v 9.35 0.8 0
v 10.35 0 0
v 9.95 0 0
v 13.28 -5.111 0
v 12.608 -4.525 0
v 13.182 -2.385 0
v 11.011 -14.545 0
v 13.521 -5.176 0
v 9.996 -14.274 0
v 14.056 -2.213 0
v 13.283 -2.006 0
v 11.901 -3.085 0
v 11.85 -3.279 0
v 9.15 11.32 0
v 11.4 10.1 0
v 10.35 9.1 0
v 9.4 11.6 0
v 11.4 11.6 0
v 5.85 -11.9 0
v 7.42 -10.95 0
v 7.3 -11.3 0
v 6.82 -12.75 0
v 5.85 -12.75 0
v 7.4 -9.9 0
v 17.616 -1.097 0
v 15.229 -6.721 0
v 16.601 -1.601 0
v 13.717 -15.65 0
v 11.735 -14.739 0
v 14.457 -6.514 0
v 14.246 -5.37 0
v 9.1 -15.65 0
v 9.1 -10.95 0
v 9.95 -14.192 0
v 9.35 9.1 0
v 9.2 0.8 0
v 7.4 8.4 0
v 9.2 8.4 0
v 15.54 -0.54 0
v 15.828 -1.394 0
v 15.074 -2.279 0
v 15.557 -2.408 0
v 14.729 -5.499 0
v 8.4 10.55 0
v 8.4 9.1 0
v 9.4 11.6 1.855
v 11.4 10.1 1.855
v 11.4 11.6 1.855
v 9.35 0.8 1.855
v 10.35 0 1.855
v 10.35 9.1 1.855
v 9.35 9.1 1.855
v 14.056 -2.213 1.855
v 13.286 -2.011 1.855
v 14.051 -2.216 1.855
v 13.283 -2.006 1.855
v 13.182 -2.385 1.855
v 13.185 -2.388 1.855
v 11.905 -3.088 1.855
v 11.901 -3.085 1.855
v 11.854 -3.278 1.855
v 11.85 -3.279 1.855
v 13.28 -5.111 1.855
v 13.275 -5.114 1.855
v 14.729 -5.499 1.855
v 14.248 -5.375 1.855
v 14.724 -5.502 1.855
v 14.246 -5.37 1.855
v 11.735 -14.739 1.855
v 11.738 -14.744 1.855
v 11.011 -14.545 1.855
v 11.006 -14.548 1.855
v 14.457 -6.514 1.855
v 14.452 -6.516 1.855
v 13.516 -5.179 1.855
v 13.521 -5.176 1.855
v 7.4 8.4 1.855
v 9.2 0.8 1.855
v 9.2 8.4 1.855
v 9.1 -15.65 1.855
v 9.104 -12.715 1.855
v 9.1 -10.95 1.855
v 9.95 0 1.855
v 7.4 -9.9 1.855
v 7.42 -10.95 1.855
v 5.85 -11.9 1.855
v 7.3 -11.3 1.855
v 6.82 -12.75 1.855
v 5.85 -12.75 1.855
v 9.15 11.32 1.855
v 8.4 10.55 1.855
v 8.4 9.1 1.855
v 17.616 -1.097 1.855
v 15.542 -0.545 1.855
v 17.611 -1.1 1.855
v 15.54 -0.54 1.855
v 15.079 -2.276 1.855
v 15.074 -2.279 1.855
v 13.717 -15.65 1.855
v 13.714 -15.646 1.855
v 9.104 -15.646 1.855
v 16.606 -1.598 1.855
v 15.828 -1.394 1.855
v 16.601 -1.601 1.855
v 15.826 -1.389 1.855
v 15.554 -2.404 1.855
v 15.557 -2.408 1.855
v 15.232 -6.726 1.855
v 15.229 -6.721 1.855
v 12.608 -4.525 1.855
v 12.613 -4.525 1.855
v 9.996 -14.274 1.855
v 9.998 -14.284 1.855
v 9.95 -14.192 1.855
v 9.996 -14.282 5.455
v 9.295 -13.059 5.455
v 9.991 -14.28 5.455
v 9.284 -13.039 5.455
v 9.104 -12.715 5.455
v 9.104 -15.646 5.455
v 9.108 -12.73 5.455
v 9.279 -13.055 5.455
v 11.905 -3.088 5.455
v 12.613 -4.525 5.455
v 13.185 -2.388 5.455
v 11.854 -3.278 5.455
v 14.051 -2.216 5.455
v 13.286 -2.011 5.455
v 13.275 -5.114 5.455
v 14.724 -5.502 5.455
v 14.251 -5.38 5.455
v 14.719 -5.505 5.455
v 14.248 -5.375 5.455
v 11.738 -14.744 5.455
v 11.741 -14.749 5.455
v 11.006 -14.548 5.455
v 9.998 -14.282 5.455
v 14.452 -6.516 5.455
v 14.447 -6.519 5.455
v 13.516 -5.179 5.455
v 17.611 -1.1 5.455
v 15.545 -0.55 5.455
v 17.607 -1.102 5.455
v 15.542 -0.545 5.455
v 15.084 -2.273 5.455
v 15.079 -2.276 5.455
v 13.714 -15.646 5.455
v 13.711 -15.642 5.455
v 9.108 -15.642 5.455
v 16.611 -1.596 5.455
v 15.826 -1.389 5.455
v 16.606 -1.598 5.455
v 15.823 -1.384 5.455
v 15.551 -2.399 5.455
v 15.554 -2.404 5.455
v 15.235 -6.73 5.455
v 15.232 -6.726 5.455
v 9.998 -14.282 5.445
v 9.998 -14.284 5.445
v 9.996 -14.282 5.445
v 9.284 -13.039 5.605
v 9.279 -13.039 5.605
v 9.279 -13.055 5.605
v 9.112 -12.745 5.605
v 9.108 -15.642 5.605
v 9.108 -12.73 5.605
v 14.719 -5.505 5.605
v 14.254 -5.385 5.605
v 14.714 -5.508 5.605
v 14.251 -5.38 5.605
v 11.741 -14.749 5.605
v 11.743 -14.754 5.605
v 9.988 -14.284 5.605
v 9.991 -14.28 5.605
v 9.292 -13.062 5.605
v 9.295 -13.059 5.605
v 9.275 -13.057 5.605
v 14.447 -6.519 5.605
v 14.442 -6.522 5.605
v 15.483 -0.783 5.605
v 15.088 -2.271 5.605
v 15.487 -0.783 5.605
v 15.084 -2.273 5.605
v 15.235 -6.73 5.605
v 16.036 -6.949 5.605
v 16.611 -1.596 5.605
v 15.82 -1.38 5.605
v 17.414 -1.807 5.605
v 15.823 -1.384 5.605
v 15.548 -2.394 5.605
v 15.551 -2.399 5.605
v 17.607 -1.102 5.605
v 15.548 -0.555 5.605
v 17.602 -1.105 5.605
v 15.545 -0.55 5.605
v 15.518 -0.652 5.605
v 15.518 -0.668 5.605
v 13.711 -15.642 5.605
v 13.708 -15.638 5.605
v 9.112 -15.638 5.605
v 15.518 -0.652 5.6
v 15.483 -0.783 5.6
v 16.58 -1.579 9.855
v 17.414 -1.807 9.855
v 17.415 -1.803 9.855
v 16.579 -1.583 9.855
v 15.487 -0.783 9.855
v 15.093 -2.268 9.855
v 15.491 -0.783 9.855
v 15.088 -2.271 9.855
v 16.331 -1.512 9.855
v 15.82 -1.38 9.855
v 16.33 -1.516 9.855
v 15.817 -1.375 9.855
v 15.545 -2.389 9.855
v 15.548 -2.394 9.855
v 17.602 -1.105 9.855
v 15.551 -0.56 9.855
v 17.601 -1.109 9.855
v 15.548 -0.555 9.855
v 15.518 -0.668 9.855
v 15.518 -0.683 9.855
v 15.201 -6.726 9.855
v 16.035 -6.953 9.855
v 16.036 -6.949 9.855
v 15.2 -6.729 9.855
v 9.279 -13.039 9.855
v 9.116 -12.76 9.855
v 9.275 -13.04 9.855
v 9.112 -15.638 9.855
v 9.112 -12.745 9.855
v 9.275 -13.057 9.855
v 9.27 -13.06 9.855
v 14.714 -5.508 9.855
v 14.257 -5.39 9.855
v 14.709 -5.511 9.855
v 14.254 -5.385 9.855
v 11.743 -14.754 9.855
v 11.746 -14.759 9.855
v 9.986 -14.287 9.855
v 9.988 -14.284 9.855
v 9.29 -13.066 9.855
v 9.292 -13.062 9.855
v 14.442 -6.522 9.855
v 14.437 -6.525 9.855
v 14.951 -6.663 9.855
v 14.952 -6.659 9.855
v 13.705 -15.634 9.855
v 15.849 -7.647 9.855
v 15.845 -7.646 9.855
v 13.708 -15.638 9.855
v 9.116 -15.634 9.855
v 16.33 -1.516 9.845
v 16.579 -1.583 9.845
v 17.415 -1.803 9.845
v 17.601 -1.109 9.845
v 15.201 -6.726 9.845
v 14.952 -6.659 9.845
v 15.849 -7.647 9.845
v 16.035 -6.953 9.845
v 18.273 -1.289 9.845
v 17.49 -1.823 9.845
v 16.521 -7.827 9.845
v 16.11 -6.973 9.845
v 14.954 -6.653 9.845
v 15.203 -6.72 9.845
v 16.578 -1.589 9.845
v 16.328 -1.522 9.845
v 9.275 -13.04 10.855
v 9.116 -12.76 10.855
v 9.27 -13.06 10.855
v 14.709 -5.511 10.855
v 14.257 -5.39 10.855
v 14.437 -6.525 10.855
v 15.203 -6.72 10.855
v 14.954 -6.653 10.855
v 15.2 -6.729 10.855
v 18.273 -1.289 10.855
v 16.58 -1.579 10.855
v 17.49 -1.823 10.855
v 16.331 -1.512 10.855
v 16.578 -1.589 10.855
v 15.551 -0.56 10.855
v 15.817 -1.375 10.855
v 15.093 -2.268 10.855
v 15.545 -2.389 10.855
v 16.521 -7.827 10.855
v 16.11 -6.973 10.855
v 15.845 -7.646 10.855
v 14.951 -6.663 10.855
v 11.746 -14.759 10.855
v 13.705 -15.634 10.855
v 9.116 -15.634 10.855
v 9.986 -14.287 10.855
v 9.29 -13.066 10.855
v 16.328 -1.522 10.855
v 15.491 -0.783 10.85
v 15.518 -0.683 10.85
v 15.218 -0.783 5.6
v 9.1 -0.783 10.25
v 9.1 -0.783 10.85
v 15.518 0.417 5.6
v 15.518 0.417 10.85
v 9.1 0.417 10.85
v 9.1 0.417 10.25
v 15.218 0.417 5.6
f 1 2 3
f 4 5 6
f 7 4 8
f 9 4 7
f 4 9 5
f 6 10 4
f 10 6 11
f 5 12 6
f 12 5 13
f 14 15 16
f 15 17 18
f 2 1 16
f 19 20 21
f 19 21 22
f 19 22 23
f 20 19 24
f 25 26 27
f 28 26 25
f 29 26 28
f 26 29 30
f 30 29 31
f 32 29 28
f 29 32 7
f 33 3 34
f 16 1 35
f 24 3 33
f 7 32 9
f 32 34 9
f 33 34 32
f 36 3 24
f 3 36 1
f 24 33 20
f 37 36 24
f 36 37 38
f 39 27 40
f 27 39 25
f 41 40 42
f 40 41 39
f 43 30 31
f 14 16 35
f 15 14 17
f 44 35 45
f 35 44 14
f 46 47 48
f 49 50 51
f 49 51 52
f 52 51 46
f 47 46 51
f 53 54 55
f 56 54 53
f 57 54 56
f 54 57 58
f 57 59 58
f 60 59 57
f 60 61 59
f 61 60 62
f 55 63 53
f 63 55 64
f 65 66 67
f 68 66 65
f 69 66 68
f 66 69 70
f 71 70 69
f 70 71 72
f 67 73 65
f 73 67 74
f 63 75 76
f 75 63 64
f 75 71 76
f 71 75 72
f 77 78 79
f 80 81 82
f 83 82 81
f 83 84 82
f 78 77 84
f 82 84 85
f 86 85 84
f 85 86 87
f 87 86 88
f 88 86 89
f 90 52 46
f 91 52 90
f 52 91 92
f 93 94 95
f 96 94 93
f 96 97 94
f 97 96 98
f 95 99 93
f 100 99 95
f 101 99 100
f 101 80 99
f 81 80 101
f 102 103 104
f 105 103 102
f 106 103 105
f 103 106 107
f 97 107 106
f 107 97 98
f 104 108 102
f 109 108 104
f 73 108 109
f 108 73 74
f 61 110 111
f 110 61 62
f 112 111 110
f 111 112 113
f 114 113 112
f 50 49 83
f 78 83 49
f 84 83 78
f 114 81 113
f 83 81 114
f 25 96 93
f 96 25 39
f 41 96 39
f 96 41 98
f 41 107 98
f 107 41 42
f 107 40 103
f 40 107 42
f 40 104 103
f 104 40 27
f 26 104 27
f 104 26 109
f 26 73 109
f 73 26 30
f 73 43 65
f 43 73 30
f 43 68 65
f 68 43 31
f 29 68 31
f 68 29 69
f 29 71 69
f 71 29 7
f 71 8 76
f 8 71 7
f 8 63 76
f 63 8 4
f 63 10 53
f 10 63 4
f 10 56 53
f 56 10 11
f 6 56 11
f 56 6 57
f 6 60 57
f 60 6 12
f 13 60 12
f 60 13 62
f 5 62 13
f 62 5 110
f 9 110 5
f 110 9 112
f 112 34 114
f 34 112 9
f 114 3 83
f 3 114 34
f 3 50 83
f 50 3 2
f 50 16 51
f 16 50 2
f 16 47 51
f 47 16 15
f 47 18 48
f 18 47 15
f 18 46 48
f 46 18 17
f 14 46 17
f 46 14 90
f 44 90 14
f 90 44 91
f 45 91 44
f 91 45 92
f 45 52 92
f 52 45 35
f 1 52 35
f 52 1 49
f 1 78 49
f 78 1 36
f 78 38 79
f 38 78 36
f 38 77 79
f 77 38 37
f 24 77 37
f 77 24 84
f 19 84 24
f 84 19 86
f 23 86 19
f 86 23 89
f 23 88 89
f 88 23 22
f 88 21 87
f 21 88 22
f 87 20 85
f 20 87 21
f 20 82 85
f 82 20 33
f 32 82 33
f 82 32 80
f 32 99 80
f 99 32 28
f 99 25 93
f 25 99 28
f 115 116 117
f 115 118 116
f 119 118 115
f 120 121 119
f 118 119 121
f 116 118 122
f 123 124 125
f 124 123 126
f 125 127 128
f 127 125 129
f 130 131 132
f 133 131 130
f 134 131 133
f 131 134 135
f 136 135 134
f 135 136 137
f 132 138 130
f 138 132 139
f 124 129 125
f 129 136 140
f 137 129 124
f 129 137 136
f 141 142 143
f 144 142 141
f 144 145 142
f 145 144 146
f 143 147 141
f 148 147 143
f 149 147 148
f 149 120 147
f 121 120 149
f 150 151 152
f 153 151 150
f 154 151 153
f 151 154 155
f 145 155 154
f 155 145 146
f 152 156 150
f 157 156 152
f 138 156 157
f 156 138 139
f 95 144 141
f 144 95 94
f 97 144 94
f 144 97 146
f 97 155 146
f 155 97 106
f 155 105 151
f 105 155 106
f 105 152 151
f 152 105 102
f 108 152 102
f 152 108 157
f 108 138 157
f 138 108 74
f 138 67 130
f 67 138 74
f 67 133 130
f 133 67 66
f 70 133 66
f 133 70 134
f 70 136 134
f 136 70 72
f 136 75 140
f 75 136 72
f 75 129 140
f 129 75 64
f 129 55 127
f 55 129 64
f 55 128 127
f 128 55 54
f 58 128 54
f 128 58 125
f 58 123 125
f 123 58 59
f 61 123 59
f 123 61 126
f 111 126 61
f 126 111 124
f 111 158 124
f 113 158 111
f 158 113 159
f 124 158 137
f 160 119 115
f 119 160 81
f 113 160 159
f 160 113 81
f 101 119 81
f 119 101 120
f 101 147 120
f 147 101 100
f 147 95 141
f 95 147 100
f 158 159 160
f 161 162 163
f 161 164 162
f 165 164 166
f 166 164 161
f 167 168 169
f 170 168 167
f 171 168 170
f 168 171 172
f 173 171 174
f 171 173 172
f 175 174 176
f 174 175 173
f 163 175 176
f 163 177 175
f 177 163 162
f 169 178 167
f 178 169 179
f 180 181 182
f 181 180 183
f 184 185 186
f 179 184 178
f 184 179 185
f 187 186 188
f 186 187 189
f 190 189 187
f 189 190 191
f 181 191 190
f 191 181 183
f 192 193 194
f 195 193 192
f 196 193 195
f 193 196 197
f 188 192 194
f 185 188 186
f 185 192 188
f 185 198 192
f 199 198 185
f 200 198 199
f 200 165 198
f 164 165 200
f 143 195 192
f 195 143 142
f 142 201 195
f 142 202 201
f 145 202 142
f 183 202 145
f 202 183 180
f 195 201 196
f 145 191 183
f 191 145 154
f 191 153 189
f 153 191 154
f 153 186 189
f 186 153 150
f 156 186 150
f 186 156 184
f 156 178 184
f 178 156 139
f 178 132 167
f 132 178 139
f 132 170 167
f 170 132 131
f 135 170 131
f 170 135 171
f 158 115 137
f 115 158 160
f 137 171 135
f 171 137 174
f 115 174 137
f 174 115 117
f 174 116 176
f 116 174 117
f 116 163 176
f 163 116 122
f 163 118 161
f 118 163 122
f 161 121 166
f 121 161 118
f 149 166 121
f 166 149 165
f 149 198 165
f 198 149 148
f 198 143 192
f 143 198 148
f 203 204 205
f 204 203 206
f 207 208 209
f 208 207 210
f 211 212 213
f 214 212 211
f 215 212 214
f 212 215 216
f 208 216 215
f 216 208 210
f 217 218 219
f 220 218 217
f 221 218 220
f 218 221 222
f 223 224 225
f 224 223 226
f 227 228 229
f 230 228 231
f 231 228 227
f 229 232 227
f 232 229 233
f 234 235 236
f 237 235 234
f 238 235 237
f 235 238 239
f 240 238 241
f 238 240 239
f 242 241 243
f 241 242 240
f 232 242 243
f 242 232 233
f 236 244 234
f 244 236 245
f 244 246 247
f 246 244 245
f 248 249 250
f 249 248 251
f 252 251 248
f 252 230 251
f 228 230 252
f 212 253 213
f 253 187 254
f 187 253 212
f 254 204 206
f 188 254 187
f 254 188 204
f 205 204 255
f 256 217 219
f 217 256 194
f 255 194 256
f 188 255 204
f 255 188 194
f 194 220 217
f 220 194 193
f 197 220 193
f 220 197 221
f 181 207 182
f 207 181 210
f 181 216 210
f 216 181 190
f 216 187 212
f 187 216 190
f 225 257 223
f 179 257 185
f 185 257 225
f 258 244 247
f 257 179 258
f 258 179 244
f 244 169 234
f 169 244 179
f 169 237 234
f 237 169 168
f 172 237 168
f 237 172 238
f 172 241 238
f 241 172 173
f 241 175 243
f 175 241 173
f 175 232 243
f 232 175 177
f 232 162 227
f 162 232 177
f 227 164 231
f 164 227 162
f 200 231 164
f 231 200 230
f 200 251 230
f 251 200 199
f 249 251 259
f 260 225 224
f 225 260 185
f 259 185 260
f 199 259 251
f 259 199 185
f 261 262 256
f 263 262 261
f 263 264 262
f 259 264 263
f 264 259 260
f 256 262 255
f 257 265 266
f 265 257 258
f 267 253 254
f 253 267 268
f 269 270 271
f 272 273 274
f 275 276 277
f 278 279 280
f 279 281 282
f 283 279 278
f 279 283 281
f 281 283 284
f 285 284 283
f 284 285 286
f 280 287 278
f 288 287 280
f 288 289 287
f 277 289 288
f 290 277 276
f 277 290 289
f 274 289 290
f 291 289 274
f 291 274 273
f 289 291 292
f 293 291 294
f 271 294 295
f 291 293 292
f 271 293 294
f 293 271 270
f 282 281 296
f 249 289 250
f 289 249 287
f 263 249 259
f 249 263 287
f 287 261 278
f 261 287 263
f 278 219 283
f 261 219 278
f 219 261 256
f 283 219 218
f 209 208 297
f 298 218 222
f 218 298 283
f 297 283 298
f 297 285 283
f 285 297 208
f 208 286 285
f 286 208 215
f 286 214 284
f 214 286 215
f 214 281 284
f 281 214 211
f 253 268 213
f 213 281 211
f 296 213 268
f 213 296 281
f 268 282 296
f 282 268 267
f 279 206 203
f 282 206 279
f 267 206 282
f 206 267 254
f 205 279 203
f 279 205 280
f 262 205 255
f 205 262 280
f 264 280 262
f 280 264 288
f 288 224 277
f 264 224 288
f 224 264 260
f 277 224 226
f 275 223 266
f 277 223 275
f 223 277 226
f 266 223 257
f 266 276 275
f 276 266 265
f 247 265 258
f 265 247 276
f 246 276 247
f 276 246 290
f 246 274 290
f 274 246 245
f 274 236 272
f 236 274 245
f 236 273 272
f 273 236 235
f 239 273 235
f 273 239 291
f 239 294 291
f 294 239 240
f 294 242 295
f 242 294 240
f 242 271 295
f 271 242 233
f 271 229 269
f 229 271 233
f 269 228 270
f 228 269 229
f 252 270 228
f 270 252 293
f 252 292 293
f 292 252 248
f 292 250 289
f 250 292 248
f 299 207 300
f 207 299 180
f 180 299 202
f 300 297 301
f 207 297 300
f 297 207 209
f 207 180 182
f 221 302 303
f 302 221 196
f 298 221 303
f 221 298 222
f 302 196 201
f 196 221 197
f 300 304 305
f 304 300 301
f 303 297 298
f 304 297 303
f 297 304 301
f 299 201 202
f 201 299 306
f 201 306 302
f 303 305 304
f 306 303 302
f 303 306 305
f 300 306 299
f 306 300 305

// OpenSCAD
// Focus click-and-lock for brenpoly's Mobile VR viewer (and the stretched iPhone 18 Pro Max remix).
//
//   PART = "wheel"    replacement focus wheel: 60 teeth on the rim, clears the shell's old nub
//   PART = "clip"     hooks through the shell's wheel slot; carries the click pawl
//   PART = "slider"   wedge that blocks the pawl from lifting: the positive lock
//   PART = "assembly" preview only (needs the shell, carriage and door STLs)
//
// Derived from upstream's wheel (the pinion is imported from it), so the output is CC BY-NC-SA.
// All clip and slider numbers are measured off the published meshes; see README.md.
//
//   openscad --backend=manifold -D 'PART="wheel"' \
//     -D 'SRCDIR="/path/to/Mobile+VR+viewer+for+modern+smartphones"' -o focus-wheel.stl focus-brake.scad
//   openscad --backend=manifold -D 'PART="clip"'   -o clip.stl   focus-brake.scad
//   openscad --backend=manifold -D 'PART="slider"' -o slider.stl focus-brake.scad

PART = "clip";
SRCDIR = "..";
FIRMNESS = 1;              // 0 soft, 1 standard, 2 firm: picks the pawl beam thickness below

/* [Parts as printed]
   Each part is exported in its print orientation. The clip and slider are drawn in the plane of
   the wheel: X is radial out through the shell wall, Z runs from the door (-) to the face (+), and
   the origin is the wheel's axle. The clip extrudes along y, downward from its bed face, so every
   flexure bends in the print plane and never across layer lines. */

/* Measured on the shell (axle-relative, unchanged by the stretch: axle and wall moved together) */
wall_x   = 9.10;     // outer face of the wall carrying the slot (x 42.10 stretched, 38.60 upstream)
wall_in  = 7.30;     // inner face at the slot's door end (x 40.30 stretched)
slot_z   = 11.30;    // slot ends at Z = +/-11.30 (z 12.95 and 35.55)
slot_y   = 3.00;     // slot sides at y = +/-3.00
foot_z   = -15.65;   // door-side limit of the clip (z 8.60): keeps it clear of the elastic door cord

/* Wheel */
teeth    = 60;       // 30.16 mm of rack per turn / 60 = 0.503 mm of focus per click
r_tip    = 13.00;    // same outside radius as upstream, so slot and carriage clearances are unchanged
tip_flat = 0.15;
rim_y0   = -2.50;    // the rim's limits along the axle, y in the assembly frame
rim_y1   = 0.50;     // upstream's rim ran to +2.50; the 2 mm saved is what the clip's tongue uses
hub_r    = 6.50;
wheel_y1 = 8.00;
bore_r   = 1.60;     // upstream 1.70. Tighter, so the pawl's load doesn't just shift the wheel on its axle
relief_r0 = 9.20;    // groove over the shell's old nub, which spans r 9.51..11.45 at its base
relief_r1 = 11.70;
relief_d  = 1.40;    // nub reaches 1.03 past y=-3.00; wheel can float 0.50 toward it; 0.37 to spare

/* Pawl */
th       = 15;       // pawl sits 15 degrees door-side of the top of the wheel
r_in     = 13.35;    // beam's inner face, clears the tooth tips by 0.35
beam_t   = [0.90, 1.05, 1.15][FIRMNESS];
s_root   = 11.20;    // beam's free length, tooth to root
head_top = 14.60;
preload  = 0.20;     // pawl is drawn this far into the valley; flanks stop it, so the beam rests just lifted
tip_w    = 0.20;

/* Lock channel, in (r, s): r radial, s along the beam, toward its root */
arch_in  = 15.15;
arch_out = 17.30;
cav_r0   = 15.65;  cav_r1 = 16.45;     // slider flange lives here
cav_s0   = -2.75;  cav_s1 =  2.55;
neck_s0  = -1.70;  neck_s1 = 1.50;     // slider rib passes through to reach the pawl head
wall_s0  = -3.50;  wall_s1 = 3.30;

/* Clip in y (print stack runs from +y down to -y) */
y_bed    = 2.85;     // clears the slot side by 0.15
y_tongue = 1.00;     // tongue and hook between here and y_bed; 0.50 clear of the rim
y_head   = -2.60;
y_open   = -2.75;    // the roof stops here, and the leaf has room...
y_cap0   = -7.00;    // ...until the cap, which catches the leaf's bumps
y_end    = -8.00;

/* Slider */
wedge_deg = 8;       // self-locks at any friction above 0.14; PETG on PETG is about 0.25
rib_s0   = -1.55;  rib_s1 = 1.35;
fl_s0    = -2.60;  fl_s1  = 2.40;
fl_r0    = 15.75;  fl_r1  = 16.35;
tip_r    = 15.10;    // rib's underside at the tip
rib_low  = 14.35;
leaf_r0  = 16.75;  leaf_r1 = 17.25;
bump_h   = 0.30;
cap_r0   = 17.35;  cap_r1  = 18.00;
L_pad    = 9.60;     // tip to the thumb pad
pad_len  = 6.00;
pad_top  = 18.50;
leaf_l   = 6.15;

/* Helpers */
function P(r, s) = [r * cos(th) - s * sin(th), -r * sin(th) - s * cos(th)];
module rs_box(r0, r1, s0, s1) { polygon([P(r0, s0), P(r1, s0), P(r1, s1), P(r0, s1)]); }

// everything above the wall, on the door side of the foot limit
module keep() { translate([wall_x, foot_z]) square([40, 60]); }

module pawl_tooth() {
    r_free = (r_tip - (PI * r_tip / teeth - tip_flat / 2)) + tip_w / 2 - preload;
    hw = (r_in - r_free) + tip_w / 2;
    polygon([P(r_free, -tip_w / 2), P(r_free, tip_w / 2), P(r_in + 0.05, hw), P(r_in + 0.05, -hw)]);
}

module channel() {
    difference() {
        rs_box(arch_in, arch_out, wall_s0, wall_s1);
        rs_box(cav_r0, cav_r1, cav_s0, cav_s1);
        rs_box(arch_in - 1, cav_r0 + 0.01, neck_s0, neck_s1);
    }
}

module arch() { rs_box(arch_in, arch_out, wall_s1 - 0.01, s_root + 8); }

// the foot and the wedge joining beam and arch at the root
module foot() {
    polygon([[wall_x, foot_z], [wall_x, -12.70], P(r_in, s_root), P(r_in + beam_t, s_root),
             P(arch_in, s_root), P(arch_out, s_root + 8), [wall_x, foot_z - 4]]);
}

module beam() {
    rs_box(r_in, r_in + beam_t, -1.5, s_root + 0.6);
    rs_box(r_in, head_top, -1.5, 1.3);
    pawl_tooth();
}

module root_voids() {
    // rounds the root's two inside corners, where the bending stress peaks
    offset(r = 0.60) offset(delta = -0.60)
        polygon([P(r_in, s_root), P(r_in, 1.5), [wall_x - 2, -6], [wall_x - 2, -12.70], [wall_x, -12.70]]);
    offset(r = 0.20) offset(delta = -0.20)
        rs_box(r_in + beam_t, arch_in, 1.31, s_root);
}

// the profile in every band; merge() fuses anything that only touches along a line
module merge() { offset(delta = -0.004) offset(delta = 0.004) offset(delta = 0.004) offset(delta = -0.004) children(); }

module body2d(with_beam) {
    merge() intersection() {
        keep();
        difference() {
            union() { arch(); channel(); foot(); if (with_beam) beam(); }
            if (with_beam) root_voids();
            rs_box(cav_r0, cav_r1, cav_s0, cav_s1);
            rs_box(arch_in - 1, cav_r0 + 0.01, neck_s0, neck_s1);
            if (!with_beam) rs_box(r_in - 1, arch_in - 0.01, -3, s_root - 1);
        }
    }
}

// The bits that only exist beside the rim, in the slot: spine, tongue, hook, and the keeper that
// stops the clip sliding back off its hook.
module slot_side2d() {
    // spine, on the outside of the wall
    translate([wall_x, foot_z]) square([0.85, 16.45]);
    // tongue, in the slot; its door end stops short of the slot's end so the hook's ramp can tighten
    translate([7.40, -10.95]) square([wall_x - 7.40 + 0.1, 19.35]);
    // hook: behind the wall's inner face, with an 18 degree ramp that takes up the wall's tolerance
    polygon([[7.42, -10.70], [7.42, -10.95], [7.30, -11.30], [6.82, -12.75], [5.85, -12.75],
             [5.85, -11.90], [7.40, -9.90]]);
    // keeper: a light beam ending in a block that drops into the slot's far end
    keeper2d();
}

module keeper2d() {
    translate([9.35, 0.0]) square([1.00, 10.0]);      // beam, 10 mm, lifts by hand
    translate([wall_x - 0.3, 0.0]) square([0.6, 0.8]); // root
    polygon([[8.40, 9.10], [8.40, 10.55], [9.15, 11.32], [9.40, 11.60], [11.40, 11.60], [11.40, 10.10], [10.35, 9.10]]);
}

// The band beyond the rim where the leg rests on the wall, chamfered so it prints without support
module leg() {
    a = P(arch_in + 0.05, wall_s0);
    hull() {
        translate([a[0] - 0.37, a[1] - 0.23, y_bed - y_open]) cube([0.3, 1.2, 0.01]);
        translate([wall_x, a[1] - 0.23, y_bed - (y_end + 0.6)]) cube([a[0] - wall_x - 0.07, 1.2, 0.6]);
    }
}

// y_open .. y_cap0: the roof stops, so the slider's leaf has room to flex
module band_open2d() {
    merge() difference() { body2d(false); rs_box(cav_r1 - 0.01, arch_out + 1, cav_s0, cav_s1); }
}

// y_cap0 .. y_end: walls carry on up and a bridge across them catches the leaf's bumps
module band_cap2d() {
    merge() difference() {
        union() { body2d(false); rs_box(arch_in + 1, cap_r1, wall_s0, cav_s0 + 0.01); rs_box(arch_in + 1, cap_r1, cav_s1 - 0.01, wall_s1);
                  rs_box(cap_r0, cap_r1, wall_s0, wall_s1); }
        rs_box(cav_r1 - 0.01, cap_r0, cav_s0, cav_s1);
    }
}

// Each band is inset a few microns on the last, so no two walls are coplanar and every edge in the
// export belongs to exactly two faces.
module band(y0, y1, inset) {
    translate([0, 0, y_bed - y1 - 0.005]) linear_extrude(height = y1 - y0 + 0.01, convexity = 8)
        offset(delta = -inset) children();
}

module clip() {
    band(y_tongue, y_bed - 0.005, 0) merge() { body2d(true); slot_side2d(); }
    band(y_head, y_tongue, 0.004) body2d(true);
    band(y_open, y_head, 0.008) body2d(false);
    band(y_cap0, y_open, 0.012) band_open2d();
    band(y_end, y_cap0, 0.016) band_cap2d();
    leg();
}

/* Slider, drawn in (L, r): L from the tip rearward. Printed on its side, stacked along s. */
module slider_flange2d() {
    polygon([[0.3, fl_r0], [L_pad, fl_r0], [L_pad, fl_r1], [0.3, fl_r1]]);
    translate([L_pad, fl_r0]) square([pad_len, pad_top - fl_r0]);
}

module slider_leaf2d() {
    // Two bumps straddle the cap when unlocked, with the leaf unloaded. The front bump's back face is
    // steep: it is the stop that keeps the slider from walking out.
    x0 = L_pad - leaf_l;
    h = leaf_r1 + bump_h;
    polygon([[L_pad + 0.1, leaf_r0], [x0, leaf_r0], [x0, leaf_r1],
             [x0 + 0.35, h], [x0 + 0.62, h], [x0 + 0.70, leaf_r1],
             [x0 + 1.80, leaf_r1],
             [x0 + 2.10, h], [x0 + 2.20, h], [x0 + 2.50, leaf_r1],
             [L_pad + 0.1, leaf_r1]]);
}

module slider_rib2d() {
    k = tan(wedge_deg);
    L_flat = (tip_r - rib_low) / k;
    polygon([[0, cav_r0], [0, tip_r + 0.25], [0.5, tip_r], [L_flat, rib_low], [L_flat + 1.5, rib_low],
             [L_flat + 2.0, fl_r0 + 0.01], [L_flat + 2.0, cav_r0 + 0.2], [0, cav_r0 + 0.2]]);
}

module slider() {
    // stack: from fl_s1 down to fl_s0 (a proper rotation into the assembly, not a mirror).
    // Rib's lower side is chamfered 45 degrees so it needs no support.
    sw = fl_s1 - fl_s0;
    linear_extrude(height = sw) slider_flange2d();
    linear_extrude(height = sw) slider_leaf2d();
    difference() {
        translate([0, 0, fl_s1 - rib_s1]) linear_extrude(height = rib_s1 - rib_s0) slider_rib2d();
        // chamfer on the bed side of the rib
        multmatrix([[1, 0, 0, -1], [0, 1, 0, fl_r0], [0, 0, 1, fl_s1 - rib_s1], [0, 0, 0, 1]])
            rotate([90, 0, 90]) linear_extrude(height = 20) polygon([[0.01, -0.01], [-1.45, -0.01], [-1.45, 1.45]]);
    }
    // grip ridges on the pad, for a thumb that can't see it
    for (i = [0 : 3]) translate([L_pad + 0.6 + i * 1.35, pad_top - 0.01, 0]) linear_extrude(height = sw)
        polygon([[0, 0], [0.45, 0.5], [0.9, 0]]);
}

/* Wheel: prints with the relief groove down, as upstream's did with its notches */
function tooth_pts(i) = let (a = 360 * i / teeth, da = 360 / teeth, hf = tip_flat / 2 / r_tip * 180 / PI,
                            d = PI * r_tip / teeth - tip_flat / 2, rv = r_tip - d)
    [[r_tip * cos(a - hf), r_tip * sin(a - hf)], [r_tip * cos(a + hf), r_tip * sin(a + hf)],
     [rv * cos(a + da / 2), rv * sin(a + da / 2)]];

module rim2d() { polygon([for (i = [0 : teeth - 1]) each tooth_pts(i)]); }

module wheel() {
    bed = rim_y0;
    h_rim = rim_y1 - rim_y0;
    h5 = 5.0;       // upstream's pinion starts here, at y = 2.50
    difference() {
        union() {
            intersection() {
                linear_extrude(height = h_rim, convexity = 4) rim2d();
                // small chamfers: first layer doesn't flare into the slot, top edge is kind to a thumb
                rotate_extrude($fn = 240)
                    polygon([[0, 0], [r_tip - 0.40, 0], [r_tip + 0.05, 0.45], [r_tip + 0.05, h_rim - 0.30],
                             [r_tip - 0.30, h_rim], [0, h_rim]]);
            }
            cylinder(r = hub_r, h = h5 + 0.01, $fn = 96);
            cylinder(r = 3.81, h = wheel_y1 - bed, $fn = 96);
            // pinion: upstream's teeth, so the rack mesh is what was measured
            intersection() {
                import(str(SRCDIR, "/Main Shell - Print-ready STLs/Focus wheel (chamfered rim down).stl"), convexity = 8);
                translate([0, 0, h5 + 0.002]) cylinder(r = 8, h = 6, $fn = 48);
            }
        }
        translate([0, 0, -1]) cylinder(r = bore_r, h = 14, $fn = 64);
        // groove over the shell's old nub
        rotate_extrude($fn = 240)
            polygon([[relief_r0, -0.01], [relief_r1, -0.01], [relief_r1 - 0.1, relief_d], [relief_r0 + 0.7, relief_d]]);
    }
}

/* Assembly preview: asm(x, y, z) = (33 + X, y_bed - pz, 24.25 + Z) */
// SHELL_STL and CARRIAGE_STL are in the assembly frame: shell STL + (0.25, 0, -0.5)
SHELL_STL = ""; CARRIAGE_STL = ""; WHEEL_STL = "focus-wheel.stl"; CLIP_STL = "clip-standard.stl"; SLIDER_STL = "slider.stl";
TIP_Y = -2.80;   // -2.80 unlocked, about 0.0 locked
module to_asm() { multmatrix([[1, 0, 0, 33], [0, 0, -1, y_bed], [0, 1, 0, 24.25], [0, 0, 0, 1]]) children(); }

module assembly() {
    if (SHELL_STL != "") color([0.38, 0.38, 0.42]) import(SHELL_STL, convexity = 10);
    if (CARRIAGE_STL != "") color([0.2, 0.42, 0.85]) import(CARRIAGE_STL, convexity = 10);
    multmatrix([[1, 0, 0, 33], [0, 0, 1, rim_y0], [0, -1, 0, 24.25], [0, 0, 0, 1]]) color([0.85, 0.25, 0.2]) import(WHEEL_STL, convexity = 8);
    to_asm() color([0.95, 0.72, 0.2]) import(CLIP_STL, convexity = 8);
    slider_to_asm(TIP_Y) color([0.25, 0.75, 0.45]) import(SLIDER_STL, convexity = 8);
}

// slider (L, r, pz) -> asm. L = TIP_Y - y; r, s rotate by th about the axle.
module slider_to_asm(tip_y) {
    translate([33, tip_y, 24.25]) multmatrix([
        [0, cos(th), sin(th), -fl_s1 * sin(th)],
        [-1, 0, 0, 0],
        [0, -sin(th), cos(th), -fl_s1 * cos(th)],
        [0, 0, 0, 1]]) children();
}

if (PART == "wheel") wheel();
else if (PART == "clip") clip();
else if (PART == "slider") slider();
else if (PART == "assembly") assembly();

// Worked numbers, printed on every run so a change of parameter shows its effect at once.
// k = E w t^3 / (4 L^3), with E = 1800 MPa, printed PETG bent in the layer plane
beam_w = y_bed - y_head;
k_pawl = 1800 * beam_w * pow(beam_t, 3) / (4 * pow(s_root, 3));
echo(str("pawl beam t ", beam_t, " mm, k = ", k_pawl, " N/mm; strain at 0.69 lift = ", 1.5 * beam_t * 0.69 / pow(s_root, 2) * 100, " %"));
echo(str("travel per click = ", PI * 9.6 / teeth, " mm"));
